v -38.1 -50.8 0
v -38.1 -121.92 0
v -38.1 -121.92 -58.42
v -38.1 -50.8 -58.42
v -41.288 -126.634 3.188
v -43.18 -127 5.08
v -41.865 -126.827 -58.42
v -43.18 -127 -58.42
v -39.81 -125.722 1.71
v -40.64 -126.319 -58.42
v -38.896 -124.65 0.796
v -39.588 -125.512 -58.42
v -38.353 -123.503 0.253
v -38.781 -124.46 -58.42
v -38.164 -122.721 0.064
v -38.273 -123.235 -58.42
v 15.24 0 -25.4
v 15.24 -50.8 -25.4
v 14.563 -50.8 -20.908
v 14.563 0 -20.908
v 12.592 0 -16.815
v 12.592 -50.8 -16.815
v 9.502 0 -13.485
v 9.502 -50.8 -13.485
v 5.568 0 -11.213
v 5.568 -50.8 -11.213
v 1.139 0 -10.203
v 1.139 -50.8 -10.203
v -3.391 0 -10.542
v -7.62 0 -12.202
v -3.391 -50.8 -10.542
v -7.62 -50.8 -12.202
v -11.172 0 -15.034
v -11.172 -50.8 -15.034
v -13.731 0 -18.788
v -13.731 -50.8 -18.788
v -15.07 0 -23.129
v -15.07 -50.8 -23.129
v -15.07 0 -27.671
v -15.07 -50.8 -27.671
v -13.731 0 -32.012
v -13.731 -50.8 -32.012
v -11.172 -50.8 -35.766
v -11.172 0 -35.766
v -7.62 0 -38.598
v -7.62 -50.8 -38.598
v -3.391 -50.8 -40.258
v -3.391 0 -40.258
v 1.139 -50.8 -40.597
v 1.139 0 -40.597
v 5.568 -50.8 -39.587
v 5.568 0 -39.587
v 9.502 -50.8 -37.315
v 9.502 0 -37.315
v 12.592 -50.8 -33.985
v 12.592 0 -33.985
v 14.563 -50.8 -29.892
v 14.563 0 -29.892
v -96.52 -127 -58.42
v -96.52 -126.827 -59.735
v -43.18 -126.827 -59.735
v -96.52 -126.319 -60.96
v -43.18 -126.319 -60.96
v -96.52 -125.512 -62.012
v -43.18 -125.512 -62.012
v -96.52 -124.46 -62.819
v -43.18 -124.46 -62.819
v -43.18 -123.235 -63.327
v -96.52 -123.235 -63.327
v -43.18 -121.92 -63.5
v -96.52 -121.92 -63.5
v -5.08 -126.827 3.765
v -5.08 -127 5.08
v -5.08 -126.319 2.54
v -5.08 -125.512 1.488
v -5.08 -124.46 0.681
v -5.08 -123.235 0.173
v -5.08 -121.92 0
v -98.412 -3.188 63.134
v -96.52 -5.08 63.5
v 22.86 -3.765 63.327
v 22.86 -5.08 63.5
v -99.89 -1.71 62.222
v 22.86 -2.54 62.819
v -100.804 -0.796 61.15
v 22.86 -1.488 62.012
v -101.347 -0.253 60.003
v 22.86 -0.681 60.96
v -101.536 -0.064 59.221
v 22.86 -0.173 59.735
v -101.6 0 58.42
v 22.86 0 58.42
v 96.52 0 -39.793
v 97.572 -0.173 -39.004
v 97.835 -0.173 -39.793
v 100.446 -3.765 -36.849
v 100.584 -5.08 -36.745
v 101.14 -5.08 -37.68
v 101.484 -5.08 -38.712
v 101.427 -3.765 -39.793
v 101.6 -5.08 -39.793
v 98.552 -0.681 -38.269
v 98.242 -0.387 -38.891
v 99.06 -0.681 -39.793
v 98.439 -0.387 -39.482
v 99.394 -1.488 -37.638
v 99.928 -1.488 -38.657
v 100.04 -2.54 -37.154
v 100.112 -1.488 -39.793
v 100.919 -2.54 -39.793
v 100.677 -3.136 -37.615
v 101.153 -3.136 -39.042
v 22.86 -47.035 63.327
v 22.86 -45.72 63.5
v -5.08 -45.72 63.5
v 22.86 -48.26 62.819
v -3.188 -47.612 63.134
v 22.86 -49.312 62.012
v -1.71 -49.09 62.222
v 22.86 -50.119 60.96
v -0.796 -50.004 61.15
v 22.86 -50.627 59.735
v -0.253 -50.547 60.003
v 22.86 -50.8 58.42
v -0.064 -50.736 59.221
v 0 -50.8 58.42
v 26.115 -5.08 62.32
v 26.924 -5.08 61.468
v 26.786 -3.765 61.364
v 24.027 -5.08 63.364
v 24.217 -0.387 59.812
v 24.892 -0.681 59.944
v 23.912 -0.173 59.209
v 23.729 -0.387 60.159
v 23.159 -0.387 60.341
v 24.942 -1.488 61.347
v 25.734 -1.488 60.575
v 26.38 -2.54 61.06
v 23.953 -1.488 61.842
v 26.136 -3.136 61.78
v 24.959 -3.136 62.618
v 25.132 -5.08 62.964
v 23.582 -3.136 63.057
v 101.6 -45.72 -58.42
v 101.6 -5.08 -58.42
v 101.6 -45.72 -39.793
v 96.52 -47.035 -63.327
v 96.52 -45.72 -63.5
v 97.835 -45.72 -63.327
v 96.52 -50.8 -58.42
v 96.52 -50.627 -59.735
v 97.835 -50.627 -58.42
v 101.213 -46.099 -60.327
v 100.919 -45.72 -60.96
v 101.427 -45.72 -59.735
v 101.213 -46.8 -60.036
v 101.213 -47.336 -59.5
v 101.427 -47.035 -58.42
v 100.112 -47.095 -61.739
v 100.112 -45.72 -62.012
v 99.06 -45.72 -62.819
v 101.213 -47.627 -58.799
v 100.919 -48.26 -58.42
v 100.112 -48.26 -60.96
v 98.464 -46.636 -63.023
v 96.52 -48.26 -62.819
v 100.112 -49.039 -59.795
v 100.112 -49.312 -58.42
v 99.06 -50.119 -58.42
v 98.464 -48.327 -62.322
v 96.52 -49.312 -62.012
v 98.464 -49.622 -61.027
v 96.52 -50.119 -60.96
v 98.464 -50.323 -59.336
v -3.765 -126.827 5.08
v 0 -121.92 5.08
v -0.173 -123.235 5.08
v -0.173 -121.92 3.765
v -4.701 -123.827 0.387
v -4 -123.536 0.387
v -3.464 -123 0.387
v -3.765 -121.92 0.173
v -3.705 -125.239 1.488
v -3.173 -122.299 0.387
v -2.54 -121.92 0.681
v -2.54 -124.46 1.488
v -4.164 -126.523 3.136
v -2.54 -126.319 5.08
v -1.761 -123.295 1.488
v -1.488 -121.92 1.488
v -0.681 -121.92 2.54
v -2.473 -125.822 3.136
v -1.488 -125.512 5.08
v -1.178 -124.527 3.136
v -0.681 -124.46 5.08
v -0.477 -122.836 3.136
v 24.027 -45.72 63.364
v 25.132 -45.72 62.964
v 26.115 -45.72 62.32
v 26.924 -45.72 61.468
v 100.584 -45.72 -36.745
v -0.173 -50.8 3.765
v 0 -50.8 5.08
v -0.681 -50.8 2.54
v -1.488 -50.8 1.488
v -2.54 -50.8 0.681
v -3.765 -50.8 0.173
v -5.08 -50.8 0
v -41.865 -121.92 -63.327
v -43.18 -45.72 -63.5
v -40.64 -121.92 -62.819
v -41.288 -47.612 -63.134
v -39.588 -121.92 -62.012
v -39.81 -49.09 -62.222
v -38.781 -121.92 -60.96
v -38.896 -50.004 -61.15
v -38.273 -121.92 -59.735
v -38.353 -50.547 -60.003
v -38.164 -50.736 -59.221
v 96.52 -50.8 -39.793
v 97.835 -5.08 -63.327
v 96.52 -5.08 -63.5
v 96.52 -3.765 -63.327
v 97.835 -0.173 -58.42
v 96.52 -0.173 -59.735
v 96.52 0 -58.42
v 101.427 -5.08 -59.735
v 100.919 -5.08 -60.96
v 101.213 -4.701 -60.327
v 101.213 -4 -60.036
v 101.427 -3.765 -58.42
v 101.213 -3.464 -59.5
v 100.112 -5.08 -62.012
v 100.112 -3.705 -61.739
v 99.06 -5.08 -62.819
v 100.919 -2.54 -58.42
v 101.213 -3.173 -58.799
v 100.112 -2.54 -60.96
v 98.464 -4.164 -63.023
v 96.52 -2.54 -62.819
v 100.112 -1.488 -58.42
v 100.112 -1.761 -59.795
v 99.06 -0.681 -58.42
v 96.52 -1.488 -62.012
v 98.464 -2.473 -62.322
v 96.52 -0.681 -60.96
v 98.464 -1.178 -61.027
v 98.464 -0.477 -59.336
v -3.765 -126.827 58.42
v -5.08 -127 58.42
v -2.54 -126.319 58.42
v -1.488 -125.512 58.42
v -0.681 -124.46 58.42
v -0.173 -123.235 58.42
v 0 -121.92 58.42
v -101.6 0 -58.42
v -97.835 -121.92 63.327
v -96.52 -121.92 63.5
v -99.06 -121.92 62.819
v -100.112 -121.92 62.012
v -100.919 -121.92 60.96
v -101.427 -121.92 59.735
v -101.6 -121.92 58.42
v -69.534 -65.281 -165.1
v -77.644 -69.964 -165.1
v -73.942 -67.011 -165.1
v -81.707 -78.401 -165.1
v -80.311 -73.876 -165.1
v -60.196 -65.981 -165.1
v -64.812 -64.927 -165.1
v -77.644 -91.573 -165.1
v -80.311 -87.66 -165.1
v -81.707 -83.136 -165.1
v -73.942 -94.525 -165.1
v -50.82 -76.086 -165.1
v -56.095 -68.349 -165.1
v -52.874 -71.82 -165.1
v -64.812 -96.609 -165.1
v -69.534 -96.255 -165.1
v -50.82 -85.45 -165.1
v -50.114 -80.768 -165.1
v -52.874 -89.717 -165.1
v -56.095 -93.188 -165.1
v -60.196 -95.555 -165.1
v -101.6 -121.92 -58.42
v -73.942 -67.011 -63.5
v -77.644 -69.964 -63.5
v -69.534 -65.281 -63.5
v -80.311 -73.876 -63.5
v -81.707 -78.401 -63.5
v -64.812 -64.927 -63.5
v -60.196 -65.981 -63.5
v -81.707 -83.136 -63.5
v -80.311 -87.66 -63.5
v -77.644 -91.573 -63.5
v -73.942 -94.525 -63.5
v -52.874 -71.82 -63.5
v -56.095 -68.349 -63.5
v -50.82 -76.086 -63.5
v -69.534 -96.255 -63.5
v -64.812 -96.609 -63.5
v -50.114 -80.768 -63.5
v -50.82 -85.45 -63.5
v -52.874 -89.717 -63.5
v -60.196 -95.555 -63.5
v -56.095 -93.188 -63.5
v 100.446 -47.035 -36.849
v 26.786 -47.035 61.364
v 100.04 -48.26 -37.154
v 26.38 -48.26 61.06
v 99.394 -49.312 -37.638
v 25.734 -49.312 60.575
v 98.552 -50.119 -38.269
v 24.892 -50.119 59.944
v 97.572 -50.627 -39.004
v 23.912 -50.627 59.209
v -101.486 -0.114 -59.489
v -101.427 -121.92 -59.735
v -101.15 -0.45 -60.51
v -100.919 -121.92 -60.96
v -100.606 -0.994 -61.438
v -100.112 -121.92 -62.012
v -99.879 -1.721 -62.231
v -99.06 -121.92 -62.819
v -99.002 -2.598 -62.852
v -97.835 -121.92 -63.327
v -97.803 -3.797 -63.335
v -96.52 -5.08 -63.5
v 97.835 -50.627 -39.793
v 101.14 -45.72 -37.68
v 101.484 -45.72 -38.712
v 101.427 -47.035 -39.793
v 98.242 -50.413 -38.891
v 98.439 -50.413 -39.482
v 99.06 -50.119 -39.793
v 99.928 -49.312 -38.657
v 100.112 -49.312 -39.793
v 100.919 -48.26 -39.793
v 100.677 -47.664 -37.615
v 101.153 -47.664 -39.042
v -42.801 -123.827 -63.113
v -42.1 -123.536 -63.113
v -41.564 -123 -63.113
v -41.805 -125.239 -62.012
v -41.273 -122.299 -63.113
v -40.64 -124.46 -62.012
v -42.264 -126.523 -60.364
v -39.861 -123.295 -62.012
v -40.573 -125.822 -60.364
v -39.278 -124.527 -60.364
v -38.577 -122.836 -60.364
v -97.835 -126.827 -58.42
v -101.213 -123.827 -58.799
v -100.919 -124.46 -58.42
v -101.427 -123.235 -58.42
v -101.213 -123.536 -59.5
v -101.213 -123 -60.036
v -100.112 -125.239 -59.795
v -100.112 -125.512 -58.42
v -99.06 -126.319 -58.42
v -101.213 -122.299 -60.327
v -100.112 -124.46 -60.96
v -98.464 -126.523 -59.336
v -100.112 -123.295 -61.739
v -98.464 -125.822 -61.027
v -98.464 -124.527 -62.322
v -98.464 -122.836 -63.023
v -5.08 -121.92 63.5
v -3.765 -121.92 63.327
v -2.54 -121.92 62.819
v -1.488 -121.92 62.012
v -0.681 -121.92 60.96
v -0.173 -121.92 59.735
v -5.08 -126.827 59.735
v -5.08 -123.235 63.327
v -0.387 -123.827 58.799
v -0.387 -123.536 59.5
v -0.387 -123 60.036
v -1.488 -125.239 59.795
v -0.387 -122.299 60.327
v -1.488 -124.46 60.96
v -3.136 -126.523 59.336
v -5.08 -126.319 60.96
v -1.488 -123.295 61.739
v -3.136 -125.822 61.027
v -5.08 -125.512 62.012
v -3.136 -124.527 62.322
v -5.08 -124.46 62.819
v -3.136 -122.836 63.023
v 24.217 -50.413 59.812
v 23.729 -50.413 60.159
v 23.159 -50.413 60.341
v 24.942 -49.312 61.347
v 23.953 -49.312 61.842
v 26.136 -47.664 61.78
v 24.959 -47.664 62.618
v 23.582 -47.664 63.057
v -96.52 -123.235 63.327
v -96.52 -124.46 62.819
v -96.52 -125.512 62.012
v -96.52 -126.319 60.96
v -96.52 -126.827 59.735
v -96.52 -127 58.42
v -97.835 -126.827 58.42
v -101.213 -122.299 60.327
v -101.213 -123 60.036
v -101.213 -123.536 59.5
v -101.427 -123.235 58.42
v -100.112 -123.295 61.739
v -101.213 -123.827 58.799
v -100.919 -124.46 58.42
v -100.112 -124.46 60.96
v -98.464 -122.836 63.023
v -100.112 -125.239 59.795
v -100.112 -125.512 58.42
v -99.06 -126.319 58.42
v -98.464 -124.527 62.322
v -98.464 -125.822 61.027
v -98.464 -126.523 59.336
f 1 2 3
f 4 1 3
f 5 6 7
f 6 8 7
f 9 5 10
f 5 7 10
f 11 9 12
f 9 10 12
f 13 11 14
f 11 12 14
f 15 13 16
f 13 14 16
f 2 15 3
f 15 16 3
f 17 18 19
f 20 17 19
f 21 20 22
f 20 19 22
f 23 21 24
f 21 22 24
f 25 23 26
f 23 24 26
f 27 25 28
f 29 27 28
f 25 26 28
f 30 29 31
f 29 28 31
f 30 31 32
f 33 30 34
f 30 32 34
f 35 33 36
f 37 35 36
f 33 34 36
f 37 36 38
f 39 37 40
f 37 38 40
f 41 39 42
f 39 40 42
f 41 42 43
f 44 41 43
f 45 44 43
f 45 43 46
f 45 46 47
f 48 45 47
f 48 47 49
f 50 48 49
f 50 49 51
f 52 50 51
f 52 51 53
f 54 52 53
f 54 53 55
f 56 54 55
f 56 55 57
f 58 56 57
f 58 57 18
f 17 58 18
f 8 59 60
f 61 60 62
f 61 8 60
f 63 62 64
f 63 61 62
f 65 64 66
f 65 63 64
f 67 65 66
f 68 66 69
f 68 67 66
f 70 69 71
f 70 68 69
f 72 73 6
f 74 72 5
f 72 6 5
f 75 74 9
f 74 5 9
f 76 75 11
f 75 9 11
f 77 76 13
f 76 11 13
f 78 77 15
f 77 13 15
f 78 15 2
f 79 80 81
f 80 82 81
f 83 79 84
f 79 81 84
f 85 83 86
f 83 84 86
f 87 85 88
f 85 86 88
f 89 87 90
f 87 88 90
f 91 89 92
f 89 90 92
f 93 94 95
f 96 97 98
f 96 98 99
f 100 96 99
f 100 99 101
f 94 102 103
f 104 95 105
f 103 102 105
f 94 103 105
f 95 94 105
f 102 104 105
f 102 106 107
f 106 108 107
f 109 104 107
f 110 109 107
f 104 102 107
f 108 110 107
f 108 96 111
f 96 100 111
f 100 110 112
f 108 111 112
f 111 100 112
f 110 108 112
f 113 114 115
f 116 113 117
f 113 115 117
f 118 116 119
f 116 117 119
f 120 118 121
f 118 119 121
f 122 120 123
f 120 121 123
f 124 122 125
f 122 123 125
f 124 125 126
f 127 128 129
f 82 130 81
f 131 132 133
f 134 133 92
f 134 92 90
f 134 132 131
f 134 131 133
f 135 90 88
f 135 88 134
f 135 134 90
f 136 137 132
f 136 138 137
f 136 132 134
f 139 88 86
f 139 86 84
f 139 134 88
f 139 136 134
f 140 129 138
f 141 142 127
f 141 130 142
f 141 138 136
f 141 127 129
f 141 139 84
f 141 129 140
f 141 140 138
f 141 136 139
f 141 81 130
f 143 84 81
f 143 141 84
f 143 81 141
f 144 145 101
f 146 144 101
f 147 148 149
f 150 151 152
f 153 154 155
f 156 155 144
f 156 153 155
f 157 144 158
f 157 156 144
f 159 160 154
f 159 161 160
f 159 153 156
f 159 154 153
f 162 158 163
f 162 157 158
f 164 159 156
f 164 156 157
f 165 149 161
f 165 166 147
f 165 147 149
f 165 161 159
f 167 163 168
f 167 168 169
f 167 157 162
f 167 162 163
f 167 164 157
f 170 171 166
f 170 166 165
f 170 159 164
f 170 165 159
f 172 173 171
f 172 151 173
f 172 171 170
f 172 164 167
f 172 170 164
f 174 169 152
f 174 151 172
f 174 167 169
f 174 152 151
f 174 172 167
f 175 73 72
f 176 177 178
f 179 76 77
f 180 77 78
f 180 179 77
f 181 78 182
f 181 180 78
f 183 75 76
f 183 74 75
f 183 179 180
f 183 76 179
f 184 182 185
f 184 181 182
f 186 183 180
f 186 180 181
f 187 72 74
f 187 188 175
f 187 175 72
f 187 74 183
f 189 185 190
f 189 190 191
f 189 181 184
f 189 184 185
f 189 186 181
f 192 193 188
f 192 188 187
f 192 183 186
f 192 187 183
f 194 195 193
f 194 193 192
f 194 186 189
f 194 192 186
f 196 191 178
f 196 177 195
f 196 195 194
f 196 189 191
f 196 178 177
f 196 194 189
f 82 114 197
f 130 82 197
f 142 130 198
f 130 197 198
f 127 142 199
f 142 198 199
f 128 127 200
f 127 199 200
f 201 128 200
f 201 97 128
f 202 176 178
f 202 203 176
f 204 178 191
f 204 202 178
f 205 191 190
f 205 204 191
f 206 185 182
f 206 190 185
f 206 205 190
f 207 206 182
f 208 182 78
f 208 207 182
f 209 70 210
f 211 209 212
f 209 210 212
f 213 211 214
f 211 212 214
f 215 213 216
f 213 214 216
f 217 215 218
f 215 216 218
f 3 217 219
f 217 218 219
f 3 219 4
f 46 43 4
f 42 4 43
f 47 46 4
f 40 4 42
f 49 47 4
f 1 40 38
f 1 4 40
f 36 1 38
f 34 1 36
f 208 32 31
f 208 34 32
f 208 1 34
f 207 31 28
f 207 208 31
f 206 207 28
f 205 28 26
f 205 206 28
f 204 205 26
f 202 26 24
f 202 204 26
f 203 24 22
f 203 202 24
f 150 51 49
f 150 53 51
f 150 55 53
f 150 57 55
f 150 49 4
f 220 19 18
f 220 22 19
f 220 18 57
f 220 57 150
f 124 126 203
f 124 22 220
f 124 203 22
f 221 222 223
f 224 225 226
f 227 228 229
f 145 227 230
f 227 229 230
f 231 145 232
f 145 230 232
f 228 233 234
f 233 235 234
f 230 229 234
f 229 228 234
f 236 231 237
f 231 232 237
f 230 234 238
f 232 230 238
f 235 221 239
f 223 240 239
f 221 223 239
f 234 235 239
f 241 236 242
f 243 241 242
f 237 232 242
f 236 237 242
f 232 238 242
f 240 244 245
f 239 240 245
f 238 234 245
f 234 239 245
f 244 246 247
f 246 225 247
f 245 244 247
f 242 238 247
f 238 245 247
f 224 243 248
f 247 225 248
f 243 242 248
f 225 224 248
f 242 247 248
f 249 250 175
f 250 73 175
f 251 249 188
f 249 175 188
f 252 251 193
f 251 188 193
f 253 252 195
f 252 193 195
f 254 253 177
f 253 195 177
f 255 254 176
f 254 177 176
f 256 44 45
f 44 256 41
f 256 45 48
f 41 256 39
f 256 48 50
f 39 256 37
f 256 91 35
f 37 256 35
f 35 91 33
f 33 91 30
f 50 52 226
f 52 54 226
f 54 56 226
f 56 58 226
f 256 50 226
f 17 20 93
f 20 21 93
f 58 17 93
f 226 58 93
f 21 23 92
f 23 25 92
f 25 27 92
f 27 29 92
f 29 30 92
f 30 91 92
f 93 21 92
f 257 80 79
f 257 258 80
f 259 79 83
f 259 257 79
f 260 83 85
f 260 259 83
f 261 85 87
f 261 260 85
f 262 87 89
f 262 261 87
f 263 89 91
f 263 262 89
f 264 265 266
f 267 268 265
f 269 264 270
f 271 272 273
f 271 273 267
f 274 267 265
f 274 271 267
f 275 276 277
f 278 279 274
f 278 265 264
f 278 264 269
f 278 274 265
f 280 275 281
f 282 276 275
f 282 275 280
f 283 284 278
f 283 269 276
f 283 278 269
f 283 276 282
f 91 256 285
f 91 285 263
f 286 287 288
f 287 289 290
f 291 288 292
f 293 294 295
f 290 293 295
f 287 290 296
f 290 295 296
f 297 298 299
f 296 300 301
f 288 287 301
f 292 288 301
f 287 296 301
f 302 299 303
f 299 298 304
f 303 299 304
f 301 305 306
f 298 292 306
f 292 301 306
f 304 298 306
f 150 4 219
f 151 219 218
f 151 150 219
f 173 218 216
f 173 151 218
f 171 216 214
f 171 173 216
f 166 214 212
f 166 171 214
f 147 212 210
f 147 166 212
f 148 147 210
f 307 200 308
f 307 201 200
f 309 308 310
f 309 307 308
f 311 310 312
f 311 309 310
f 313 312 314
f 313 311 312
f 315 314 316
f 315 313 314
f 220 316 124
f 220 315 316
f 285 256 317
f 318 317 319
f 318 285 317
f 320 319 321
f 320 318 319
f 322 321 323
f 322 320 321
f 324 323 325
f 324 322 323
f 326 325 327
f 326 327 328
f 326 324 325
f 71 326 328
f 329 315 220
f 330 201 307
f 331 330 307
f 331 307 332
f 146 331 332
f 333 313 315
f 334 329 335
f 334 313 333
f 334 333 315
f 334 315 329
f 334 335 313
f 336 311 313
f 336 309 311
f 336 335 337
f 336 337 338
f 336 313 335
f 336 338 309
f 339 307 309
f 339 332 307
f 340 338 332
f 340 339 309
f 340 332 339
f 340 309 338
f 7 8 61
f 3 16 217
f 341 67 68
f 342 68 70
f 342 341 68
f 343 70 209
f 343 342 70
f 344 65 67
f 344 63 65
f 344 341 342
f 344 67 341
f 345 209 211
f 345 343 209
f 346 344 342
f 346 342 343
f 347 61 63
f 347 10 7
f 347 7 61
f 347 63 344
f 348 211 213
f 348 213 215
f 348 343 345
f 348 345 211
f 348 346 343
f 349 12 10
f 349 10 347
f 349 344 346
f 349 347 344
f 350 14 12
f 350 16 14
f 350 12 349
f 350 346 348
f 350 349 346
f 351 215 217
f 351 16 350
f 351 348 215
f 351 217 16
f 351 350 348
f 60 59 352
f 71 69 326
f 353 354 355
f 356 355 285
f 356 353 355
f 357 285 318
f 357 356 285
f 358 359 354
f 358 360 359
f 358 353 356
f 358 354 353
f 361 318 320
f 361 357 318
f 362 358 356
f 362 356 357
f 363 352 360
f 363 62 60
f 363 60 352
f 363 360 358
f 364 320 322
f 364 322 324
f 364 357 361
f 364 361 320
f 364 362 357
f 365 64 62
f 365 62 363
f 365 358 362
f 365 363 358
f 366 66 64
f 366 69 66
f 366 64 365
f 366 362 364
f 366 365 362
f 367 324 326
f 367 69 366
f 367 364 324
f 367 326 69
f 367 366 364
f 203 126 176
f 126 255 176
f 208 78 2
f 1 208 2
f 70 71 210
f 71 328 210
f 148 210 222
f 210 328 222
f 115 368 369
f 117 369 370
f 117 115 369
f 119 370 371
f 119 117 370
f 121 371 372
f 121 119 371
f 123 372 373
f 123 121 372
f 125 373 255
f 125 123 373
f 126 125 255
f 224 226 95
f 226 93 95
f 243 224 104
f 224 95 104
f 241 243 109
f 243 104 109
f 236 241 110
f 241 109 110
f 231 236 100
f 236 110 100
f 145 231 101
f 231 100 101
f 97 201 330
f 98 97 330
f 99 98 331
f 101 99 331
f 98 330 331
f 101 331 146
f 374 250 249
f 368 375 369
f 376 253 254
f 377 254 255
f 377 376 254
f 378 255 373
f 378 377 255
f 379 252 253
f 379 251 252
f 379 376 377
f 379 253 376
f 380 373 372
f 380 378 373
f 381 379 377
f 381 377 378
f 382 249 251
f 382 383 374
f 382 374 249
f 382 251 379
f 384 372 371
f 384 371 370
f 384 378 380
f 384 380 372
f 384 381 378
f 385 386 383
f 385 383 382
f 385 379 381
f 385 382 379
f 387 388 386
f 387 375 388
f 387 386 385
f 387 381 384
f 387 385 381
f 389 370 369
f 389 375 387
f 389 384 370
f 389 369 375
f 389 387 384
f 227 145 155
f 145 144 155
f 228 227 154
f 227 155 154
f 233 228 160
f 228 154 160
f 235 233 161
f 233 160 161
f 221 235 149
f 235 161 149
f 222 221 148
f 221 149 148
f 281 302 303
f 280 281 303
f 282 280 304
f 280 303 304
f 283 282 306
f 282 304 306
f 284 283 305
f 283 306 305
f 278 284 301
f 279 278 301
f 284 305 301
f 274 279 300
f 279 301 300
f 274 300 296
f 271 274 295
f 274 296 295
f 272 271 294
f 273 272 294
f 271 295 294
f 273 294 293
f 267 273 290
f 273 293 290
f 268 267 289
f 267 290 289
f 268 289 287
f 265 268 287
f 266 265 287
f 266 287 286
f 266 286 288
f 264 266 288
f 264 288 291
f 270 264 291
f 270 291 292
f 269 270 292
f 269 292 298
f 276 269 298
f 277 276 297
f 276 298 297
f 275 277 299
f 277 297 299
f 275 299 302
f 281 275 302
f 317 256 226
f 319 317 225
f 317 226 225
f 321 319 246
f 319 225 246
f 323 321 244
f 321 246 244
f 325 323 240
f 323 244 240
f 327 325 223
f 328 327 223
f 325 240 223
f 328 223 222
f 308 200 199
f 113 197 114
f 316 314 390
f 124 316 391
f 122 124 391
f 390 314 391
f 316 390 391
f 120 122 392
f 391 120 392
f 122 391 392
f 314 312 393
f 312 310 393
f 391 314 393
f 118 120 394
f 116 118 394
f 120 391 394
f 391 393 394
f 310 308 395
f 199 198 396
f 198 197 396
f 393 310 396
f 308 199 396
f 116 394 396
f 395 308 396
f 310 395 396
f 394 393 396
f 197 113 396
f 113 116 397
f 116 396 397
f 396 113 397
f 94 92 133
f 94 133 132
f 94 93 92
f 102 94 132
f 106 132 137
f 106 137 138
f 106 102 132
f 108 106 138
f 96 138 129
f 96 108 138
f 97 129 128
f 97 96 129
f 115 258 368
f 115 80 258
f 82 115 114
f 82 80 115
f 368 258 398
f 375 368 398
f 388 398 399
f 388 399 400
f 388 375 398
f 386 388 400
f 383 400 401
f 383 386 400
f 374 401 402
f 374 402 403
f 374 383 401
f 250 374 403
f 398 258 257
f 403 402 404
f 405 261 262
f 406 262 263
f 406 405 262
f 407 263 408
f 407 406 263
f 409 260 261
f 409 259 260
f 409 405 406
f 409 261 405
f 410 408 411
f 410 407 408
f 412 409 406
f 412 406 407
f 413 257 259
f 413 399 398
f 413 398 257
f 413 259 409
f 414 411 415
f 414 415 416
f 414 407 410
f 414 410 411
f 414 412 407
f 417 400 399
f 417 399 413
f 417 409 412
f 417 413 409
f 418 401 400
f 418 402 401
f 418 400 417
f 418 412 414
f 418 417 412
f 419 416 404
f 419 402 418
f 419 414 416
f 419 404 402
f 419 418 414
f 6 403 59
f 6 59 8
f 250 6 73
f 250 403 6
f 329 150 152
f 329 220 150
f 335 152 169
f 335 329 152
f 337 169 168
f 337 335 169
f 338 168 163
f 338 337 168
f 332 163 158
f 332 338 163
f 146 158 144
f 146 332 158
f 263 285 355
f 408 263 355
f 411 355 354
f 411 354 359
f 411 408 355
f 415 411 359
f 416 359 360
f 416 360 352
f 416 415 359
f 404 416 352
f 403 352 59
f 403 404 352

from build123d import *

# Parameters (mm, degrees)
F0_W     = 203.2
F0_H     = 127
F1_DEPTH = 127
F3_DEPTH = 76.2
F4_SIZE2 = 101.6
F4_SIZE  = 76.2
F5_R     = 5.08
F6_R     = 15.24
F7_DEPTH = 381
F8_R     = 15.8851382335
F9_DEPTH = 101.6


with BuildPart() as f1:
    # F0 (on Front) → F1 (new body)
    with BuildSketch(Plane.XZ):
        Rectangle(F0_W, F0_H)
    extrude(amount=F1_DEPTH)

    # F2 (on face) → F3 (cut)
    with BuildSketch(Plane.XZ.offset(127)):
        Polygon((-38.1, 0), (-38.1, -63.5), (101.6, -63.5), (101.6, 63.5), (0, 63.5), (0, 0), align=None)
    extrude(amount=-F3_DEPTH, mode=Mode.SUBTRACT)

    # F4
    f4_edges = [f1.edges().sort_by_distance(p)[0] for p in [
        (101.6, -25.4, 63.5),
    ]]
    f4_side = f1.faces().sort_by_distance((-21.771429, -52.614286, 63.5))[0]
    chamfer(f4_edges, length=F4_SIZE, length2=F4_SIZE2, reference=f4_side)

    # F5
    f5_edges = [f1.edges().sort_by_distance(p)[0] for p in [
        (-50.8, -127, 63.5),
        (-101.6, -63.5, 63.5),
        (12.7, -50.8, 63.5),
        (0, -127, 31.75),
        (-19.05, -127, 0),
        (-38.1, -127, -31.75),
        (-69.85, -127, -63.5),
        (-101.6, -127, 0),
        (-38.1, -88.9, -63.5),
        (31.75, -50.8, -63.5),
        (0, 0, -63.5),
        (101.6, -25.4, -63.5),
        (-101.6, -63.5, -63.5),
        (-38.1, 0, 63.5),
        (25.4, -25.4, 63.5),
        (0, -88.9, 63.5),
        (0, -88.9, 0),
        (101.6, -25.4, -38.1),
        (63.5, -50.8, 12.7),
        (63.5, 0, 12.7),
        (101.6, -50.8, -50.8),
        (101.6, 0, -50.8),
    ]]
    fillet(f5_edges, radius=F5_R)

    # F6 (on face) → F7 (cut)
    with BuildSketch(Plane.XZ.offset(50.8)):
        with Locations((0, -25.4)):
            Circle(F6_R)
    extrude(amount=-F7_DEPTH, mode=Mode.SUBTRACT)


with BuildPart() as f9:
    # F8 (on face) → F9 (new body)
    with BuildSketch(Plane(origin=(0, 0, -63.5), x_dir=(1, 0, 0), z_dir=(0, 0, -1))):
        with Locations((-65.9993290901, 80.7681381702)):
            Circle(F8_R)
    extrude(amount=F9_DEPTH)


solid = Compound([f1.part, f9.part])
